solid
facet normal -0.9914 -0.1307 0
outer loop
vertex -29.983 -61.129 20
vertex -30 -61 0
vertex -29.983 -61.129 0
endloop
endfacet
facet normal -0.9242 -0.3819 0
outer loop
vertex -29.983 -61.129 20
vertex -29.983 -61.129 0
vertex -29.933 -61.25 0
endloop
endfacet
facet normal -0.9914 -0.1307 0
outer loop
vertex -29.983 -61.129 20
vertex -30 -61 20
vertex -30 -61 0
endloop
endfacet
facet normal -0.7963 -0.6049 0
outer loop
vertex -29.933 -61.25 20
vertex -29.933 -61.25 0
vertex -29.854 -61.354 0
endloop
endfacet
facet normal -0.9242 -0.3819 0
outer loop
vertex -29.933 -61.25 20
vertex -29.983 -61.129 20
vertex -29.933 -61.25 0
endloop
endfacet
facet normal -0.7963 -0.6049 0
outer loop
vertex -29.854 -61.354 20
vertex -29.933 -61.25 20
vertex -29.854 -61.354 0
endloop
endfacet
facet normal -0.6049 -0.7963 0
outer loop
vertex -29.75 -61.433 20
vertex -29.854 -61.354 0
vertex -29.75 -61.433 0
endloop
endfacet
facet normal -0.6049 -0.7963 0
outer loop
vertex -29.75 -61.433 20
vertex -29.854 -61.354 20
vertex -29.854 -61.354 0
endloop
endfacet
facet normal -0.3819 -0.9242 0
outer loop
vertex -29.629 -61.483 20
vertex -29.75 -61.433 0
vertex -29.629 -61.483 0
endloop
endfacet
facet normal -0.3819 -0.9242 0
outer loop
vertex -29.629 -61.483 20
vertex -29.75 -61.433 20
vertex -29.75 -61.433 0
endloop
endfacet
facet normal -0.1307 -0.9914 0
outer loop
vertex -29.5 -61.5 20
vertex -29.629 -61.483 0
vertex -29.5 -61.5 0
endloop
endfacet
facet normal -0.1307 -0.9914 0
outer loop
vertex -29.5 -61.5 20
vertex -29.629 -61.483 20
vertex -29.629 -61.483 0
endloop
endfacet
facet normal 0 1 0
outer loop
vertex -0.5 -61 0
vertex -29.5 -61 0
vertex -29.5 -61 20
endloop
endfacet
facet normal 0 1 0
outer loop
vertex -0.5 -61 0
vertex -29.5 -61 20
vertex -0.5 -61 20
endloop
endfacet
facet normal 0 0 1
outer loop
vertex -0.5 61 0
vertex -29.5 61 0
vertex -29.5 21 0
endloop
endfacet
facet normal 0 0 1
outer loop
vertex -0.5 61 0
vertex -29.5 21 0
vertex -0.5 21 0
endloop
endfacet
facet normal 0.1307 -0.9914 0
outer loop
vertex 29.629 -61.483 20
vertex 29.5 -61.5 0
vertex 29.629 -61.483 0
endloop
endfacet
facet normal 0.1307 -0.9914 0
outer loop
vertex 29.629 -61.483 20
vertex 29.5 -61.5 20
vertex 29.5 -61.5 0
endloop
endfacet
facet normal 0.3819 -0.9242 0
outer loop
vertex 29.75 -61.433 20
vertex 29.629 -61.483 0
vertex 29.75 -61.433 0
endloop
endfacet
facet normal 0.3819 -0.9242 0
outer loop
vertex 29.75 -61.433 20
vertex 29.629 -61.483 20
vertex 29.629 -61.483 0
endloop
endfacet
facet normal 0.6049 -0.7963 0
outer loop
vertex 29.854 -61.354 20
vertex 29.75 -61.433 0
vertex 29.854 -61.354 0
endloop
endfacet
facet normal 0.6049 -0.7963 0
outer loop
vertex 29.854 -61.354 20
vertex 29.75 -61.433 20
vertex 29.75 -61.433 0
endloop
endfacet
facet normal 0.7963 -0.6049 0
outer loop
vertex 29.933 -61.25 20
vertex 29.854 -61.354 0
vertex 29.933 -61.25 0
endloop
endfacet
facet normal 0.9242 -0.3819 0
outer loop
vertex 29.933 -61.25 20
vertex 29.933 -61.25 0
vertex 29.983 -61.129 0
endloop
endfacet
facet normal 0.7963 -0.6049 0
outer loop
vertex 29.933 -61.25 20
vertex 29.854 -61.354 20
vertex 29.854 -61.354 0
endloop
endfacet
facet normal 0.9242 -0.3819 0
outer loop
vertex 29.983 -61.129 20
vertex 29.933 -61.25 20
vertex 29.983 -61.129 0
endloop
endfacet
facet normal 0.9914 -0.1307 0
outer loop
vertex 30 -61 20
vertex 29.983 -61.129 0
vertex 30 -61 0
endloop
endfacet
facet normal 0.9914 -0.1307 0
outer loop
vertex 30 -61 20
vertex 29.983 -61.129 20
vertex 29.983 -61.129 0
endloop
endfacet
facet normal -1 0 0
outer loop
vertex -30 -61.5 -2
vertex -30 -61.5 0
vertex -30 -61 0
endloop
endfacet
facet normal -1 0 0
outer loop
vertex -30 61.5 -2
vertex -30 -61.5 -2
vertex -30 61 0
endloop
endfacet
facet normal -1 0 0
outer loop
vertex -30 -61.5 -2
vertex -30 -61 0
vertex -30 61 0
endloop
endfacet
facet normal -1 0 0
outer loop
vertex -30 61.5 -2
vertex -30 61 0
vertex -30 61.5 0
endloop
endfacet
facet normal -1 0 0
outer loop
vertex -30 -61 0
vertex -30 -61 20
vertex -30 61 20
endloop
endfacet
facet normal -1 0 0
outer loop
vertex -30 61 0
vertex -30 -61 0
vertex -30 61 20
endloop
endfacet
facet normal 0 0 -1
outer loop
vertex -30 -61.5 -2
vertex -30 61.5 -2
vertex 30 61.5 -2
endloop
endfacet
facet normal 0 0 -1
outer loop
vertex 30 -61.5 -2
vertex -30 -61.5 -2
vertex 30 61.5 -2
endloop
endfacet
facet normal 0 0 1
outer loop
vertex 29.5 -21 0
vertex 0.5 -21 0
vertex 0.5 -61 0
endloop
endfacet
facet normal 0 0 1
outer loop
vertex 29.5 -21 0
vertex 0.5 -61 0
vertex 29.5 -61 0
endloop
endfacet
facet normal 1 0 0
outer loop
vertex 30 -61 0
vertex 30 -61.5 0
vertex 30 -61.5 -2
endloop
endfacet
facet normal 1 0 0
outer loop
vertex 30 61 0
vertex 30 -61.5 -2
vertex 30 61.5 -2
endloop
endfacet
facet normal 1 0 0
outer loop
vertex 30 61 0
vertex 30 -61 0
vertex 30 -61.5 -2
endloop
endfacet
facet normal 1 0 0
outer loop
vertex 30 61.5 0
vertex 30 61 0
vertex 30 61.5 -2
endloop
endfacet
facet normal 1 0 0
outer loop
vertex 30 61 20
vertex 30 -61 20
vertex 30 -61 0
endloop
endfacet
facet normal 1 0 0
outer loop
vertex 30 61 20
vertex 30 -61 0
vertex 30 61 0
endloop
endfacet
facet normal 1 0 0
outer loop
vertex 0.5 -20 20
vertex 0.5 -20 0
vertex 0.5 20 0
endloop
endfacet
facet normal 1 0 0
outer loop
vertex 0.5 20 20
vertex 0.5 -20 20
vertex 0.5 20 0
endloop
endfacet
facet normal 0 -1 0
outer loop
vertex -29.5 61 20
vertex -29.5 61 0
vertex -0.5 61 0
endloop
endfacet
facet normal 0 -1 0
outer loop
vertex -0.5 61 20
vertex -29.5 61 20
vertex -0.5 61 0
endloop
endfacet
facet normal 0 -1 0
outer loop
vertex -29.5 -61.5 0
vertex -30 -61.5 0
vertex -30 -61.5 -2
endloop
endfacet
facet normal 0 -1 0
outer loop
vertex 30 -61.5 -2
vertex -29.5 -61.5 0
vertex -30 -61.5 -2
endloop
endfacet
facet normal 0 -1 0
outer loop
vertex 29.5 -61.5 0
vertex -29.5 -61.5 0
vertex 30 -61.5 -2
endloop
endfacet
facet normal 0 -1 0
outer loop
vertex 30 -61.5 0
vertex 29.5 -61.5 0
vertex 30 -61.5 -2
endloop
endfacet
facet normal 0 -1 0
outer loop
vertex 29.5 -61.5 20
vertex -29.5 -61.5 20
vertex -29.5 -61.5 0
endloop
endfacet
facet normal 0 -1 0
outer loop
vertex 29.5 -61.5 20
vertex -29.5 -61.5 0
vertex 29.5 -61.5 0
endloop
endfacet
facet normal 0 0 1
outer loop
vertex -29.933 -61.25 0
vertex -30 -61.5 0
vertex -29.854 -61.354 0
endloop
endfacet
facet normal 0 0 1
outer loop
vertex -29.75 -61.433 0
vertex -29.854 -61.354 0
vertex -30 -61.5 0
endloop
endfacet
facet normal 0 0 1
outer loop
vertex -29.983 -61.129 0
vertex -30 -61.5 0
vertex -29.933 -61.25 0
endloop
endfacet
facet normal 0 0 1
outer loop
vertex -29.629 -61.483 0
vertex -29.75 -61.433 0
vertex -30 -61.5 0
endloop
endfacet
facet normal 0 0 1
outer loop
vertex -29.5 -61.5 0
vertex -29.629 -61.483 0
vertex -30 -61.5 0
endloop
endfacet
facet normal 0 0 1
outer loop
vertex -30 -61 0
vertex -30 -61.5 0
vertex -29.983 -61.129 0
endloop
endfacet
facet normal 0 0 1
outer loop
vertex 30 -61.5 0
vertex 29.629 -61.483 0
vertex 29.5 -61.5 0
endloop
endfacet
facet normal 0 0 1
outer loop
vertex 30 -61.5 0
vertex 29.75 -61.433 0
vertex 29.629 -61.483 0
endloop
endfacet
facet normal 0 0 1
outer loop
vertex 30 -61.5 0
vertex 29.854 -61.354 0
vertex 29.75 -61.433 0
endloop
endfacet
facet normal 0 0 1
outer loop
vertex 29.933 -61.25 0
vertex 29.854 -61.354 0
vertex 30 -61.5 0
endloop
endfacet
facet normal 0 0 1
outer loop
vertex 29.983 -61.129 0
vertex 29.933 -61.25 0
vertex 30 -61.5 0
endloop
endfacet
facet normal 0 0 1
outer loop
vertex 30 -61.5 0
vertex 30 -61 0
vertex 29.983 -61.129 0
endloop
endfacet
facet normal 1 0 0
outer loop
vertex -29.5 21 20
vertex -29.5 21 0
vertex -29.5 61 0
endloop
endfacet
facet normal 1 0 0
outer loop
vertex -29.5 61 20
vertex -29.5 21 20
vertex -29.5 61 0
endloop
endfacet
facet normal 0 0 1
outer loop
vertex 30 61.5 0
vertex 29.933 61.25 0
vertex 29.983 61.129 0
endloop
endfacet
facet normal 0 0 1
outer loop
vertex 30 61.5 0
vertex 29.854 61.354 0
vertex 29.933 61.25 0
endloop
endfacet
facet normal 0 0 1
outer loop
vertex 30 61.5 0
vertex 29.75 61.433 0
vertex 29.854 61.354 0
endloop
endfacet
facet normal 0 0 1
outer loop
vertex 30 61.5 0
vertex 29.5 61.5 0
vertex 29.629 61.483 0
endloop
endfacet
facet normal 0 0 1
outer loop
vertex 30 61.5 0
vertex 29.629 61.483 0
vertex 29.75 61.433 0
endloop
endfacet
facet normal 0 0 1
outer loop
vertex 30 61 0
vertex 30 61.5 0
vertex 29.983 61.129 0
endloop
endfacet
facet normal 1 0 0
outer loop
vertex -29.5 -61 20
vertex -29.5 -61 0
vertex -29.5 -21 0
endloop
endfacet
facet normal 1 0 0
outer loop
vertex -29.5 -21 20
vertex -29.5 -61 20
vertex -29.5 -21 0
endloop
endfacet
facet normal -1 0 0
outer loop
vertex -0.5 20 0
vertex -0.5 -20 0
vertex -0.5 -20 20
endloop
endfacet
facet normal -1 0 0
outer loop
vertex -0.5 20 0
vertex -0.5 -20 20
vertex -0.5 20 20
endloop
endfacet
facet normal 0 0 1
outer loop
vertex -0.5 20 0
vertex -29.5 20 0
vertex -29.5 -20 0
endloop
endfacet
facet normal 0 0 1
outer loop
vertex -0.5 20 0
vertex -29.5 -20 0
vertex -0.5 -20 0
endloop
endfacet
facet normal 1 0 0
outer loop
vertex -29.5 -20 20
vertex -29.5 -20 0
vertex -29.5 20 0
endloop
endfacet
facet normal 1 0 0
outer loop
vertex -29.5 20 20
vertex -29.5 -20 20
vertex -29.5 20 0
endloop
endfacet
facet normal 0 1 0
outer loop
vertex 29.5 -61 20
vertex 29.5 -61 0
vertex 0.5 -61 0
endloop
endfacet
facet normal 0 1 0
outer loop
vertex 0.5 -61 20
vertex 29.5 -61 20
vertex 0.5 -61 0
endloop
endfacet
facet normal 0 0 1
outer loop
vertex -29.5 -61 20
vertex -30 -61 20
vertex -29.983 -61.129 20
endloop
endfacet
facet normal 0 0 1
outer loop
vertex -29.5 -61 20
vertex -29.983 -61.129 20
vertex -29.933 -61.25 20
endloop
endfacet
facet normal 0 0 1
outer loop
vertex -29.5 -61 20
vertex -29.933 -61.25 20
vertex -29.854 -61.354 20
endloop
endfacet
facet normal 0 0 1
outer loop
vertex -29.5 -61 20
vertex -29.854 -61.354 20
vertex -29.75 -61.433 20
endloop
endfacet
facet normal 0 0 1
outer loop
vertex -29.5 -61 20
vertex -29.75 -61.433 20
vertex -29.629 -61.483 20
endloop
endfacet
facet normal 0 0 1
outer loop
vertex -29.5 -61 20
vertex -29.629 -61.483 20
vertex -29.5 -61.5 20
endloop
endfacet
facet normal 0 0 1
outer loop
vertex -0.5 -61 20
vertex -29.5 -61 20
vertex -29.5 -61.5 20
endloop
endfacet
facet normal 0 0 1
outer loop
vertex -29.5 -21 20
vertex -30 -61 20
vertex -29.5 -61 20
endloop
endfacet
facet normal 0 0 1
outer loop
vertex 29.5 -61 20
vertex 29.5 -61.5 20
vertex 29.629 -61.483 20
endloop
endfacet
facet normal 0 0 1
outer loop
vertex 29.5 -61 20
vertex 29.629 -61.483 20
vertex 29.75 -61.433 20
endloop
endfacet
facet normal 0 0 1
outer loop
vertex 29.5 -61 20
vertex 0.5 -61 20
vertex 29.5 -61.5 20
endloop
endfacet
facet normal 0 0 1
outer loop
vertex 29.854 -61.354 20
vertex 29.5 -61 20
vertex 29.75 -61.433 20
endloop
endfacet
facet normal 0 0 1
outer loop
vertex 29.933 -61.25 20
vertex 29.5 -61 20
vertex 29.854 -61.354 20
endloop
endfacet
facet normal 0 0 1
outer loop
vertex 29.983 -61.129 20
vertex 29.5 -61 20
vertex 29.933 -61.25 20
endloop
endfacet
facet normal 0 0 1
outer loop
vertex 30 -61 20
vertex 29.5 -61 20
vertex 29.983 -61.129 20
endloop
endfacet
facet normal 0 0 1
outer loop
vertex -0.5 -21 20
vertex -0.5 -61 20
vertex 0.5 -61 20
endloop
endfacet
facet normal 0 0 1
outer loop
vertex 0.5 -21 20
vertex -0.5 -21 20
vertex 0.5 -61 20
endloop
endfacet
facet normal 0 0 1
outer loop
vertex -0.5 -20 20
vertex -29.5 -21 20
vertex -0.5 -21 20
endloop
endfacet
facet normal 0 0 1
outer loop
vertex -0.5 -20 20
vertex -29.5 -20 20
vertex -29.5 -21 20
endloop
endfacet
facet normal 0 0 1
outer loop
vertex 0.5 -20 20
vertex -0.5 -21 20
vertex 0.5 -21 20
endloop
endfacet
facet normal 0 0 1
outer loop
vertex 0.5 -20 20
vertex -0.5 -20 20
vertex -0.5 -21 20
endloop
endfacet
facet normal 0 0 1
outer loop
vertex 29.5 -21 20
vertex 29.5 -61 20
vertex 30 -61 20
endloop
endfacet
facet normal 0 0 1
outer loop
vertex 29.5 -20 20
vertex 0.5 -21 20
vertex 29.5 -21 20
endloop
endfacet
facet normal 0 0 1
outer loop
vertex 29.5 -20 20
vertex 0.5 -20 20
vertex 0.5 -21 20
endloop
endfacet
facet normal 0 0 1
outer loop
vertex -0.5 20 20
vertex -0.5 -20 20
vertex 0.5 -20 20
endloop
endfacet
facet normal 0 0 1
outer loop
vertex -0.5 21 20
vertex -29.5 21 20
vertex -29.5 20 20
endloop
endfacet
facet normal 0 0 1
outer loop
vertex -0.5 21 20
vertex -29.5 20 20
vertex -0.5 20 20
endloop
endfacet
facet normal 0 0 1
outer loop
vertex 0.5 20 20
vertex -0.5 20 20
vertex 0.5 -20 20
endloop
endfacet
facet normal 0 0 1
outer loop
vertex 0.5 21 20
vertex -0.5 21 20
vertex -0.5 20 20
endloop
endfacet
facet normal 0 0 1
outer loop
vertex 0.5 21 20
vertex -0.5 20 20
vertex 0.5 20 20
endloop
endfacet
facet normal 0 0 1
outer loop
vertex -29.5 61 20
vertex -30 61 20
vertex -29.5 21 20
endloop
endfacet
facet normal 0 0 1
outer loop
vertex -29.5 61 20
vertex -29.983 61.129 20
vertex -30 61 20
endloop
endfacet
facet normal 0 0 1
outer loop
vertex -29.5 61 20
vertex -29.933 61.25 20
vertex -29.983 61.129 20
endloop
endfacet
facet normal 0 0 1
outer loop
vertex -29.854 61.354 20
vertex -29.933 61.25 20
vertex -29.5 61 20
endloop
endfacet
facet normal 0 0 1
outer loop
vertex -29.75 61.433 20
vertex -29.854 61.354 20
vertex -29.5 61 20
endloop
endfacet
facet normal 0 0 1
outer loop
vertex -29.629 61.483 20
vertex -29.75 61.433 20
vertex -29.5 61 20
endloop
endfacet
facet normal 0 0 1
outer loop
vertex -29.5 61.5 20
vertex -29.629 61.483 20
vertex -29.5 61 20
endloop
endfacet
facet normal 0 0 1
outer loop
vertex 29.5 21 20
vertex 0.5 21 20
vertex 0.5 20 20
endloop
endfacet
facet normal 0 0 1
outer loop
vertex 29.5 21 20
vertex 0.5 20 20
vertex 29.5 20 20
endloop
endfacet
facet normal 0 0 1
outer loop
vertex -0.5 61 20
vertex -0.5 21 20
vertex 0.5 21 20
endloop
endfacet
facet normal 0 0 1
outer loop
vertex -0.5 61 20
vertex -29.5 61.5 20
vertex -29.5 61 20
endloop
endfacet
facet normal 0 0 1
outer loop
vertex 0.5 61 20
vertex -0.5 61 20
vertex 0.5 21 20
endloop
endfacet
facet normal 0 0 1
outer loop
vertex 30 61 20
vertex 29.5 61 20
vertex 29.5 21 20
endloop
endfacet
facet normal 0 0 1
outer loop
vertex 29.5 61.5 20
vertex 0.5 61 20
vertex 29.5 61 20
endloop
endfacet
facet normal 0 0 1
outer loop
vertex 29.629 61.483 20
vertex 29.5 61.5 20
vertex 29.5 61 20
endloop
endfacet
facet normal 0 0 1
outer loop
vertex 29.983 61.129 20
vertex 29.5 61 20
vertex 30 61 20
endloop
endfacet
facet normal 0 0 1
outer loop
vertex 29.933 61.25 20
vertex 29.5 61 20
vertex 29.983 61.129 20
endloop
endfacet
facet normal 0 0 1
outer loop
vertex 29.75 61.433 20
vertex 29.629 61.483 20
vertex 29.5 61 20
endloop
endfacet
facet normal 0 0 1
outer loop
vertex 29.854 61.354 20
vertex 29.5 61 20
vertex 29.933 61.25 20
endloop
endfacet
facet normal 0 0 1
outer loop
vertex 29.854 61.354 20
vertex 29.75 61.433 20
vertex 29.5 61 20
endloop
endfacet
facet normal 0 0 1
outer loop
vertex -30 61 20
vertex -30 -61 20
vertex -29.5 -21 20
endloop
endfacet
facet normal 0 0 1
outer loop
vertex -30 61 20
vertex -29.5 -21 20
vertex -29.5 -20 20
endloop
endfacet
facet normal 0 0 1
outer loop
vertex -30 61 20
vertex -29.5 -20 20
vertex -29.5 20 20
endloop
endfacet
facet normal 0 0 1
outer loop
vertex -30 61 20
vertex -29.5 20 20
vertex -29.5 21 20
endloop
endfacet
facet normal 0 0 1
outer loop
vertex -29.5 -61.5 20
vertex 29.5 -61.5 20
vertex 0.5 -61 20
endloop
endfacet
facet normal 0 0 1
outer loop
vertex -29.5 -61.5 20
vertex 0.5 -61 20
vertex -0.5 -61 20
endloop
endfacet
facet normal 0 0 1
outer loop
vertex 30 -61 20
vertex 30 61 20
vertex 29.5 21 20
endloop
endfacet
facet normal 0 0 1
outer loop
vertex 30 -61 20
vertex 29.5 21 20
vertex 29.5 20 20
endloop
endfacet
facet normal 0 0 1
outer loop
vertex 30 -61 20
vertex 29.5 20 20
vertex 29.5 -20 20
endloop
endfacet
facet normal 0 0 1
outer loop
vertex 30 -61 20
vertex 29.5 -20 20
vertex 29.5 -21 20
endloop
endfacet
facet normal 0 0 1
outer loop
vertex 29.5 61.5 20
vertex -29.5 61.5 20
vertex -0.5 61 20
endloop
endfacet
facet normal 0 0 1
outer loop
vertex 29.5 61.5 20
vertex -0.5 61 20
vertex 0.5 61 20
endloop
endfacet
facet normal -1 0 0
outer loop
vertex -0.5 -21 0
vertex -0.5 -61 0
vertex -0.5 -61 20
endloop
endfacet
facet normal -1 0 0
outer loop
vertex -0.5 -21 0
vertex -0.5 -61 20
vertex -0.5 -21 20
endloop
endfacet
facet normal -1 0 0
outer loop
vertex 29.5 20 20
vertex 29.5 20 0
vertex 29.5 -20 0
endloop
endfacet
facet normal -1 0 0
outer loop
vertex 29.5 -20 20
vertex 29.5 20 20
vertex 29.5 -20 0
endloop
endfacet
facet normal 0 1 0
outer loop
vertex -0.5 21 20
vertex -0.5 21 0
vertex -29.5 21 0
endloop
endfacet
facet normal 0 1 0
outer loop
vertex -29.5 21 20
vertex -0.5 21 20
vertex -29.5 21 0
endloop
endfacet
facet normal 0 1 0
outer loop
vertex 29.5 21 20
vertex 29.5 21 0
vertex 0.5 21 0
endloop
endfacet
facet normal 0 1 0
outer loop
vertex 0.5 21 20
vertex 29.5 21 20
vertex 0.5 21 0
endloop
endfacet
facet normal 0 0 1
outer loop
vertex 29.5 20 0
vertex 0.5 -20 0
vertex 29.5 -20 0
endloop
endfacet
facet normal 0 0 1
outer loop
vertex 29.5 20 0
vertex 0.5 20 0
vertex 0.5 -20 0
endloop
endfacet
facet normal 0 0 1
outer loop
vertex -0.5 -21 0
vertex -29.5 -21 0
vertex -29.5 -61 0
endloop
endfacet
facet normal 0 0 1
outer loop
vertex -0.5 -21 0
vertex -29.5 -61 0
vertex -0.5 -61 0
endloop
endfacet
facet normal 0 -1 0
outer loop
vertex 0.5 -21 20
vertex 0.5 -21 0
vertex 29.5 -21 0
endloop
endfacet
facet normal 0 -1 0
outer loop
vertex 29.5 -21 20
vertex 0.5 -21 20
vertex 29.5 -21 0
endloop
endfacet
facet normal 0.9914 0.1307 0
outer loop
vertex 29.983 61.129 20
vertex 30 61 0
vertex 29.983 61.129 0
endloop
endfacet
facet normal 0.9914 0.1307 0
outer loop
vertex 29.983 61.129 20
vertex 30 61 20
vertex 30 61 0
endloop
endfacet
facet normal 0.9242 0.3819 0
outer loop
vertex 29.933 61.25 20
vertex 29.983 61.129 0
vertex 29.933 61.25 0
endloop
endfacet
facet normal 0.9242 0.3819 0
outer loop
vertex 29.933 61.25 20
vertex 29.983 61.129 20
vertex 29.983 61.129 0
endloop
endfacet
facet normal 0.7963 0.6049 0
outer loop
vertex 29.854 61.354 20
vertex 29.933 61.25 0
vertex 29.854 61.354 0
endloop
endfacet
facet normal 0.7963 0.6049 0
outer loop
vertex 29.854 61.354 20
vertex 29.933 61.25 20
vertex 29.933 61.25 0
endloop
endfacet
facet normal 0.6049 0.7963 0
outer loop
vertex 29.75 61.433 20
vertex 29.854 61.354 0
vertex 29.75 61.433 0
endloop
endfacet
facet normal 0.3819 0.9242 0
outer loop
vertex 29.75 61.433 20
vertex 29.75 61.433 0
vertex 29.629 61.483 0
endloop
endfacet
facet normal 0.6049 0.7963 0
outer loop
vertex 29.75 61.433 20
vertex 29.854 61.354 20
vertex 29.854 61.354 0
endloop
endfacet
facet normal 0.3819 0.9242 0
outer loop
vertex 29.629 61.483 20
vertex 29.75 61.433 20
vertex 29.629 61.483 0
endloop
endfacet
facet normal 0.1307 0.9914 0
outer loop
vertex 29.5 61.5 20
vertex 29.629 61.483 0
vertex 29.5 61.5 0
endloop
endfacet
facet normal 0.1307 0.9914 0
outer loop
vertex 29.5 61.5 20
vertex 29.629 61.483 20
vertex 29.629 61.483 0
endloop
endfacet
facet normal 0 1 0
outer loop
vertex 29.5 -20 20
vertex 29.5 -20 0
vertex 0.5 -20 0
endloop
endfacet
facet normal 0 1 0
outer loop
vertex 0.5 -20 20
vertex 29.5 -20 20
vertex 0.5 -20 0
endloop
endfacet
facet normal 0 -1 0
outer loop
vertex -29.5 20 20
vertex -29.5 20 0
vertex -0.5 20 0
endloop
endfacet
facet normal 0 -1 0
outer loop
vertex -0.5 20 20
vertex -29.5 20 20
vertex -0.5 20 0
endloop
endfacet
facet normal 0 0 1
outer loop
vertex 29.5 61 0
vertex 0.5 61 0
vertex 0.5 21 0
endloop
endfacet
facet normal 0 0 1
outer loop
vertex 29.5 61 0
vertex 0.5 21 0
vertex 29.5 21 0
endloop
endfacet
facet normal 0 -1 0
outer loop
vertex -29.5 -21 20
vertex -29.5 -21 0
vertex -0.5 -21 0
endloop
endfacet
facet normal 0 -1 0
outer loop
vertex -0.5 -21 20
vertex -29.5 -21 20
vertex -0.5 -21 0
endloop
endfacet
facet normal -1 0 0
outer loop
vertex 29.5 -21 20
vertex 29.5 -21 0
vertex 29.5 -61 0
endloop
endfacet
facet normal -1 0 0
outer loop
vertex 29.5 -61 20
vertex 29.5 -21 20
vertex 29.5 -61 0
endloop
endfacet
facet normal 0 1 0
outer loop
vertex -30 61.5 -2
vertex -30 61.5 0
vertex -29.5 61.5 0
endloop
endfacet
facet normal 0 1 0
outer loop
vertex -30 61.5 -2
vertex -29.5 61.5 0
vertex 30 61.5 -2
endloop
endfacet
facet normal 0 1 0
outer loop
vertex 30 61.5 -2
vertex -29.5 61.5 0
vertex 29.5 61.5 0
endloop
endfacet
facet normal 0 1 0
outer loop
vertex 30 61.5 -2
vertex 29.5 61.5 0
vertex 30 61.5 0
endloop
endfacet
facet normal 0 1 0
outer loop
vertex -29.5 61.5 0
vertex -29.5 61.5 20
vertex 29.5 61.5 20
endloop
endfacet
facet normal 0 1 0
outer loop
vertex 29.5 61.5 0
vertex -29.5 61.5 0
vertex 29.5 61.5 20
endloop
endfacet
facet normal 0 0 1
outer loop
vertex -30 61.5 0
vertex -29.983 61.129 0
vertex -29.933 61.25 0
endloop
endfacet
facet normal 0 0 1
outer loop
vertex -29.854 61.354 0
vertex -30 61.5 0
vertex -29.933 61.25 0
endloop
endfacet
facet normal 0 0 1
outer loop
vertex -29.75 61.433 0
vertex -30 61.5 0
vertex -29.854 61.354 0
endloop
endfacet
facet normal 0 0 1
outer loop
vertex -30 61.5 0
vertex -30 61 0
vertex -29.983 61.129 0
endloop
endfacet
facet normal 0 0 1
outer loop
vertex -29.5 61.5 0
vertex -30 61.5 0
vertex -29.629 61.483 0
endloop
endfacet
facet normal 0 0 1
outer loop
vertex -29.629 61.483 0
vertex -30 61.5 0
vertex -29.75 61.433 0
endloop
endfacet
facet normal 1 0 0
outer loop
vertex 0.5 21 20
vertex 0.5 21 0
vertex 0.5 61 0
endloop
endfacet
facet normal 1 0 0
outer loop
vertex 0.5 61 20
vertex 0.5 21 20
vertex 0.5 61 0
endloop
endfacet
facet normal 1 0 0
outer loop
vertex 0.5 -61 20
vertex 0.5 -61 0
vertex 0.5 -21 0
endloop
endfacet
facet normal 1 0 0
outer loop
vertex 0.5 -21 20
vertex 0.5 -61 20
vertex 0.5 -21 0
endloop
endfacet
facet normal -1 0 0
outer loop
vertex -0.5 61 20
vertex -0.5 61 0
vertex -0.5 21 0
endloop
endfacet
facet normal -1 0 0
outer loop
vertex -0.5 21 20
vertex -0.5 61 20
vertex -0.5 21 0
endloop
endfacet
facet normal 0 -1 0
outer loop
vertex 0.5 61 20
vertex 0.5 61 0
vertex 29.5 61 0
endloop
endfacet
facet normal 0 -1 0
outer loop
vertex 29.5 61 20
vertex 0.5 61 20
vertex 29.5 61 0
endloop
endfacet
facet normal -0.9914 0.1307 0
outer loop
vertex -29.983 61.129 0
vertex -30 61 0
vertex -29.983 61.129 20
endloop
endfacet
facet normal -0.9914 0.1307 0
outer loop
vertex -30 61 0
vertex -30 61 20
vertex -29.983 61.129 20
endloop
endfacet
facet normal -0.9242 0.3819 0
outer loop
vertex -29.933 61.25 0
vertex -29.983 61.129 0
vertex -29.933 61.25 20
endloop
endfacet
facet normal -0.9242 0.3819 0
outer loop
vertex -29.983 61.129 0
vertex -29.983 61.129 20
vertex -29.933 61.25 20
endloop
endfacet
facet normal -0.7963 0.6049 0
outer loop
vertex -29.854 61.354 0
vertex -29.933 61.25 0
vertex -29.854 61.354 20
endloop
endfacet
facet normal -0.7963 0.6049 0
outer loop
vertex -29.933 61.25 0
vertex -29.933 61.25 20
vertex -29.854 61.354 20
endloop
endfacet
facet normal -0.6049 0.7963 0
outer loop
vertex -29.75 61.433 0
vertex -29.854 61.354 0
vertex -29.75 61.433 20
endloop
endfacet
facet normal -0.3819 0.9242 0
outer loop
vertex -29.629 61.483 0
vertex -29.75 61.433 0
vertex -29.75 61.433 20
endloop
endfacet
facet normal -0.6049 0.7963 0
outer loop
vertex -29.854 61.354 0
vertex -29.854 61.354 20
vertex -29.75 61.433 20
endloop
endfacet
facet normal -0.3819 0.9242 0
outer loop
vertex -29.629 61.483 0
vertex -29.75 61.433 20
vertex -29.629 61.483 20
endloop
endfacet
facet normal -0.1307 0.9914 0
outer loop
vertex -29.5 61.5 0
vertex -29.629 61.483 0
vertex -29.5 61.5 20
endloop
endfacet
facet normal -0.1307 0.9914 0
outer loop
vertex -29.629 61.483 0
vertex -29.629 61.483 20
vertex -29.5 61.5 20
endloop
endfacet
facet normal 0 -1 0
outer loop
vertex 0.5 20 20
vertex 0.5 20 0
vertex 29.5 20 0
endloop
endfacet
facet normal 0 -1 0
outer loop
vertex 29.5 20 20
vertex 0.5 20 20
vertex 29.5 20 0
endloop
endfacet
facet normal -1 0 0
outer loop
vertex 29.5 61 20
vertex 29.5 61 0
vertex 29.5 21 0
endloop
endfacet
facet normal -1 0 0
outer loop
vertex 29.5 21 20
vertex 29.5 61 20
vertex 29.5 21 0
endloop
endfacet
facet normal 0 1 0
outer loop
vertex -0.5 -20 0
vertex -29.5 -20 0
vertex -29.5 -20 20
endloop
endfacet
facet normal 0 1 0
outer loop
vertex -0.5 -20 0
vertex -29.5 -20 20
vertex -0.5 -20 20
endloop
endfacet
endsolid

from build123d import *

# Parameters (mm, degrees)
F0_W     = 29
F0_H     = 40
F1_DEPTH = 20
F2_R     = 0.5
F3_W     = 60
F3_H     = 123
F4_DEPTH = 2


with BuildPart() as f1:
    # F0 (on Top) → F1 (new body)
    with BuildSketch(Plane.XY):
        Polygon((-15, 61.5), (-30, 61.5), (-30, 20.5), (-30, -20.5), (-30, -61.5), (0, -61.5), (15, -61.5), (30, -61.5), (30, 61.5), (15, 61.5), (0, 61.5), align=None)
        with Locations((-15, -41)):
            Rectangle(F0_W, F0_H, mode=Mode.SUBTRACT)
        Polygon((0.5, -21), (15, -21), (29.5, -21), (29.5, -61), (0.5, -61), align=None, mode=Mode.SUBTRACT)
        with Locations((-15, 0)):
            Rectangle(F0_W, F0_H, mode=Mode.SUBTRACT)
        Polygon((-29.5, 61), (-15, 61), (-0.5, 61), (-0.5, 21), (-29.5, 21), align=None, mode=Mode.SUBTRACT)
        Polygon((0.5, -20), (0.5, 20), (29.5, 20), (29.5, -20), (15, -20), align=None, mode=Mode.SUBTRACT)
        Polygon((0.5, 61), (15, 61), (29.5, 61), (29.5, 21), (0.5, 21), align=None, mode=Mode.SUBTRACT)
    extrude(amount=F1_DEPTH)

    # F2
    f2_edges = [f1.edges().sort_by_distance(p)[0] for p in [
        (30, 61.5, 10),
        (30, -61.5, 10),
        (-30, -61.5, 10),
        (-30, 61.5, 10),
    ]]
    fillet(f2_edges, radius=F2_R)

    # F3 (on Top) → F4 (join)
    with BuildSketch(Plane.XY):
        Rectangle(F3_W, F3_H)
    extrude(amount=-F4_DEPTH)


solid = f1.part
